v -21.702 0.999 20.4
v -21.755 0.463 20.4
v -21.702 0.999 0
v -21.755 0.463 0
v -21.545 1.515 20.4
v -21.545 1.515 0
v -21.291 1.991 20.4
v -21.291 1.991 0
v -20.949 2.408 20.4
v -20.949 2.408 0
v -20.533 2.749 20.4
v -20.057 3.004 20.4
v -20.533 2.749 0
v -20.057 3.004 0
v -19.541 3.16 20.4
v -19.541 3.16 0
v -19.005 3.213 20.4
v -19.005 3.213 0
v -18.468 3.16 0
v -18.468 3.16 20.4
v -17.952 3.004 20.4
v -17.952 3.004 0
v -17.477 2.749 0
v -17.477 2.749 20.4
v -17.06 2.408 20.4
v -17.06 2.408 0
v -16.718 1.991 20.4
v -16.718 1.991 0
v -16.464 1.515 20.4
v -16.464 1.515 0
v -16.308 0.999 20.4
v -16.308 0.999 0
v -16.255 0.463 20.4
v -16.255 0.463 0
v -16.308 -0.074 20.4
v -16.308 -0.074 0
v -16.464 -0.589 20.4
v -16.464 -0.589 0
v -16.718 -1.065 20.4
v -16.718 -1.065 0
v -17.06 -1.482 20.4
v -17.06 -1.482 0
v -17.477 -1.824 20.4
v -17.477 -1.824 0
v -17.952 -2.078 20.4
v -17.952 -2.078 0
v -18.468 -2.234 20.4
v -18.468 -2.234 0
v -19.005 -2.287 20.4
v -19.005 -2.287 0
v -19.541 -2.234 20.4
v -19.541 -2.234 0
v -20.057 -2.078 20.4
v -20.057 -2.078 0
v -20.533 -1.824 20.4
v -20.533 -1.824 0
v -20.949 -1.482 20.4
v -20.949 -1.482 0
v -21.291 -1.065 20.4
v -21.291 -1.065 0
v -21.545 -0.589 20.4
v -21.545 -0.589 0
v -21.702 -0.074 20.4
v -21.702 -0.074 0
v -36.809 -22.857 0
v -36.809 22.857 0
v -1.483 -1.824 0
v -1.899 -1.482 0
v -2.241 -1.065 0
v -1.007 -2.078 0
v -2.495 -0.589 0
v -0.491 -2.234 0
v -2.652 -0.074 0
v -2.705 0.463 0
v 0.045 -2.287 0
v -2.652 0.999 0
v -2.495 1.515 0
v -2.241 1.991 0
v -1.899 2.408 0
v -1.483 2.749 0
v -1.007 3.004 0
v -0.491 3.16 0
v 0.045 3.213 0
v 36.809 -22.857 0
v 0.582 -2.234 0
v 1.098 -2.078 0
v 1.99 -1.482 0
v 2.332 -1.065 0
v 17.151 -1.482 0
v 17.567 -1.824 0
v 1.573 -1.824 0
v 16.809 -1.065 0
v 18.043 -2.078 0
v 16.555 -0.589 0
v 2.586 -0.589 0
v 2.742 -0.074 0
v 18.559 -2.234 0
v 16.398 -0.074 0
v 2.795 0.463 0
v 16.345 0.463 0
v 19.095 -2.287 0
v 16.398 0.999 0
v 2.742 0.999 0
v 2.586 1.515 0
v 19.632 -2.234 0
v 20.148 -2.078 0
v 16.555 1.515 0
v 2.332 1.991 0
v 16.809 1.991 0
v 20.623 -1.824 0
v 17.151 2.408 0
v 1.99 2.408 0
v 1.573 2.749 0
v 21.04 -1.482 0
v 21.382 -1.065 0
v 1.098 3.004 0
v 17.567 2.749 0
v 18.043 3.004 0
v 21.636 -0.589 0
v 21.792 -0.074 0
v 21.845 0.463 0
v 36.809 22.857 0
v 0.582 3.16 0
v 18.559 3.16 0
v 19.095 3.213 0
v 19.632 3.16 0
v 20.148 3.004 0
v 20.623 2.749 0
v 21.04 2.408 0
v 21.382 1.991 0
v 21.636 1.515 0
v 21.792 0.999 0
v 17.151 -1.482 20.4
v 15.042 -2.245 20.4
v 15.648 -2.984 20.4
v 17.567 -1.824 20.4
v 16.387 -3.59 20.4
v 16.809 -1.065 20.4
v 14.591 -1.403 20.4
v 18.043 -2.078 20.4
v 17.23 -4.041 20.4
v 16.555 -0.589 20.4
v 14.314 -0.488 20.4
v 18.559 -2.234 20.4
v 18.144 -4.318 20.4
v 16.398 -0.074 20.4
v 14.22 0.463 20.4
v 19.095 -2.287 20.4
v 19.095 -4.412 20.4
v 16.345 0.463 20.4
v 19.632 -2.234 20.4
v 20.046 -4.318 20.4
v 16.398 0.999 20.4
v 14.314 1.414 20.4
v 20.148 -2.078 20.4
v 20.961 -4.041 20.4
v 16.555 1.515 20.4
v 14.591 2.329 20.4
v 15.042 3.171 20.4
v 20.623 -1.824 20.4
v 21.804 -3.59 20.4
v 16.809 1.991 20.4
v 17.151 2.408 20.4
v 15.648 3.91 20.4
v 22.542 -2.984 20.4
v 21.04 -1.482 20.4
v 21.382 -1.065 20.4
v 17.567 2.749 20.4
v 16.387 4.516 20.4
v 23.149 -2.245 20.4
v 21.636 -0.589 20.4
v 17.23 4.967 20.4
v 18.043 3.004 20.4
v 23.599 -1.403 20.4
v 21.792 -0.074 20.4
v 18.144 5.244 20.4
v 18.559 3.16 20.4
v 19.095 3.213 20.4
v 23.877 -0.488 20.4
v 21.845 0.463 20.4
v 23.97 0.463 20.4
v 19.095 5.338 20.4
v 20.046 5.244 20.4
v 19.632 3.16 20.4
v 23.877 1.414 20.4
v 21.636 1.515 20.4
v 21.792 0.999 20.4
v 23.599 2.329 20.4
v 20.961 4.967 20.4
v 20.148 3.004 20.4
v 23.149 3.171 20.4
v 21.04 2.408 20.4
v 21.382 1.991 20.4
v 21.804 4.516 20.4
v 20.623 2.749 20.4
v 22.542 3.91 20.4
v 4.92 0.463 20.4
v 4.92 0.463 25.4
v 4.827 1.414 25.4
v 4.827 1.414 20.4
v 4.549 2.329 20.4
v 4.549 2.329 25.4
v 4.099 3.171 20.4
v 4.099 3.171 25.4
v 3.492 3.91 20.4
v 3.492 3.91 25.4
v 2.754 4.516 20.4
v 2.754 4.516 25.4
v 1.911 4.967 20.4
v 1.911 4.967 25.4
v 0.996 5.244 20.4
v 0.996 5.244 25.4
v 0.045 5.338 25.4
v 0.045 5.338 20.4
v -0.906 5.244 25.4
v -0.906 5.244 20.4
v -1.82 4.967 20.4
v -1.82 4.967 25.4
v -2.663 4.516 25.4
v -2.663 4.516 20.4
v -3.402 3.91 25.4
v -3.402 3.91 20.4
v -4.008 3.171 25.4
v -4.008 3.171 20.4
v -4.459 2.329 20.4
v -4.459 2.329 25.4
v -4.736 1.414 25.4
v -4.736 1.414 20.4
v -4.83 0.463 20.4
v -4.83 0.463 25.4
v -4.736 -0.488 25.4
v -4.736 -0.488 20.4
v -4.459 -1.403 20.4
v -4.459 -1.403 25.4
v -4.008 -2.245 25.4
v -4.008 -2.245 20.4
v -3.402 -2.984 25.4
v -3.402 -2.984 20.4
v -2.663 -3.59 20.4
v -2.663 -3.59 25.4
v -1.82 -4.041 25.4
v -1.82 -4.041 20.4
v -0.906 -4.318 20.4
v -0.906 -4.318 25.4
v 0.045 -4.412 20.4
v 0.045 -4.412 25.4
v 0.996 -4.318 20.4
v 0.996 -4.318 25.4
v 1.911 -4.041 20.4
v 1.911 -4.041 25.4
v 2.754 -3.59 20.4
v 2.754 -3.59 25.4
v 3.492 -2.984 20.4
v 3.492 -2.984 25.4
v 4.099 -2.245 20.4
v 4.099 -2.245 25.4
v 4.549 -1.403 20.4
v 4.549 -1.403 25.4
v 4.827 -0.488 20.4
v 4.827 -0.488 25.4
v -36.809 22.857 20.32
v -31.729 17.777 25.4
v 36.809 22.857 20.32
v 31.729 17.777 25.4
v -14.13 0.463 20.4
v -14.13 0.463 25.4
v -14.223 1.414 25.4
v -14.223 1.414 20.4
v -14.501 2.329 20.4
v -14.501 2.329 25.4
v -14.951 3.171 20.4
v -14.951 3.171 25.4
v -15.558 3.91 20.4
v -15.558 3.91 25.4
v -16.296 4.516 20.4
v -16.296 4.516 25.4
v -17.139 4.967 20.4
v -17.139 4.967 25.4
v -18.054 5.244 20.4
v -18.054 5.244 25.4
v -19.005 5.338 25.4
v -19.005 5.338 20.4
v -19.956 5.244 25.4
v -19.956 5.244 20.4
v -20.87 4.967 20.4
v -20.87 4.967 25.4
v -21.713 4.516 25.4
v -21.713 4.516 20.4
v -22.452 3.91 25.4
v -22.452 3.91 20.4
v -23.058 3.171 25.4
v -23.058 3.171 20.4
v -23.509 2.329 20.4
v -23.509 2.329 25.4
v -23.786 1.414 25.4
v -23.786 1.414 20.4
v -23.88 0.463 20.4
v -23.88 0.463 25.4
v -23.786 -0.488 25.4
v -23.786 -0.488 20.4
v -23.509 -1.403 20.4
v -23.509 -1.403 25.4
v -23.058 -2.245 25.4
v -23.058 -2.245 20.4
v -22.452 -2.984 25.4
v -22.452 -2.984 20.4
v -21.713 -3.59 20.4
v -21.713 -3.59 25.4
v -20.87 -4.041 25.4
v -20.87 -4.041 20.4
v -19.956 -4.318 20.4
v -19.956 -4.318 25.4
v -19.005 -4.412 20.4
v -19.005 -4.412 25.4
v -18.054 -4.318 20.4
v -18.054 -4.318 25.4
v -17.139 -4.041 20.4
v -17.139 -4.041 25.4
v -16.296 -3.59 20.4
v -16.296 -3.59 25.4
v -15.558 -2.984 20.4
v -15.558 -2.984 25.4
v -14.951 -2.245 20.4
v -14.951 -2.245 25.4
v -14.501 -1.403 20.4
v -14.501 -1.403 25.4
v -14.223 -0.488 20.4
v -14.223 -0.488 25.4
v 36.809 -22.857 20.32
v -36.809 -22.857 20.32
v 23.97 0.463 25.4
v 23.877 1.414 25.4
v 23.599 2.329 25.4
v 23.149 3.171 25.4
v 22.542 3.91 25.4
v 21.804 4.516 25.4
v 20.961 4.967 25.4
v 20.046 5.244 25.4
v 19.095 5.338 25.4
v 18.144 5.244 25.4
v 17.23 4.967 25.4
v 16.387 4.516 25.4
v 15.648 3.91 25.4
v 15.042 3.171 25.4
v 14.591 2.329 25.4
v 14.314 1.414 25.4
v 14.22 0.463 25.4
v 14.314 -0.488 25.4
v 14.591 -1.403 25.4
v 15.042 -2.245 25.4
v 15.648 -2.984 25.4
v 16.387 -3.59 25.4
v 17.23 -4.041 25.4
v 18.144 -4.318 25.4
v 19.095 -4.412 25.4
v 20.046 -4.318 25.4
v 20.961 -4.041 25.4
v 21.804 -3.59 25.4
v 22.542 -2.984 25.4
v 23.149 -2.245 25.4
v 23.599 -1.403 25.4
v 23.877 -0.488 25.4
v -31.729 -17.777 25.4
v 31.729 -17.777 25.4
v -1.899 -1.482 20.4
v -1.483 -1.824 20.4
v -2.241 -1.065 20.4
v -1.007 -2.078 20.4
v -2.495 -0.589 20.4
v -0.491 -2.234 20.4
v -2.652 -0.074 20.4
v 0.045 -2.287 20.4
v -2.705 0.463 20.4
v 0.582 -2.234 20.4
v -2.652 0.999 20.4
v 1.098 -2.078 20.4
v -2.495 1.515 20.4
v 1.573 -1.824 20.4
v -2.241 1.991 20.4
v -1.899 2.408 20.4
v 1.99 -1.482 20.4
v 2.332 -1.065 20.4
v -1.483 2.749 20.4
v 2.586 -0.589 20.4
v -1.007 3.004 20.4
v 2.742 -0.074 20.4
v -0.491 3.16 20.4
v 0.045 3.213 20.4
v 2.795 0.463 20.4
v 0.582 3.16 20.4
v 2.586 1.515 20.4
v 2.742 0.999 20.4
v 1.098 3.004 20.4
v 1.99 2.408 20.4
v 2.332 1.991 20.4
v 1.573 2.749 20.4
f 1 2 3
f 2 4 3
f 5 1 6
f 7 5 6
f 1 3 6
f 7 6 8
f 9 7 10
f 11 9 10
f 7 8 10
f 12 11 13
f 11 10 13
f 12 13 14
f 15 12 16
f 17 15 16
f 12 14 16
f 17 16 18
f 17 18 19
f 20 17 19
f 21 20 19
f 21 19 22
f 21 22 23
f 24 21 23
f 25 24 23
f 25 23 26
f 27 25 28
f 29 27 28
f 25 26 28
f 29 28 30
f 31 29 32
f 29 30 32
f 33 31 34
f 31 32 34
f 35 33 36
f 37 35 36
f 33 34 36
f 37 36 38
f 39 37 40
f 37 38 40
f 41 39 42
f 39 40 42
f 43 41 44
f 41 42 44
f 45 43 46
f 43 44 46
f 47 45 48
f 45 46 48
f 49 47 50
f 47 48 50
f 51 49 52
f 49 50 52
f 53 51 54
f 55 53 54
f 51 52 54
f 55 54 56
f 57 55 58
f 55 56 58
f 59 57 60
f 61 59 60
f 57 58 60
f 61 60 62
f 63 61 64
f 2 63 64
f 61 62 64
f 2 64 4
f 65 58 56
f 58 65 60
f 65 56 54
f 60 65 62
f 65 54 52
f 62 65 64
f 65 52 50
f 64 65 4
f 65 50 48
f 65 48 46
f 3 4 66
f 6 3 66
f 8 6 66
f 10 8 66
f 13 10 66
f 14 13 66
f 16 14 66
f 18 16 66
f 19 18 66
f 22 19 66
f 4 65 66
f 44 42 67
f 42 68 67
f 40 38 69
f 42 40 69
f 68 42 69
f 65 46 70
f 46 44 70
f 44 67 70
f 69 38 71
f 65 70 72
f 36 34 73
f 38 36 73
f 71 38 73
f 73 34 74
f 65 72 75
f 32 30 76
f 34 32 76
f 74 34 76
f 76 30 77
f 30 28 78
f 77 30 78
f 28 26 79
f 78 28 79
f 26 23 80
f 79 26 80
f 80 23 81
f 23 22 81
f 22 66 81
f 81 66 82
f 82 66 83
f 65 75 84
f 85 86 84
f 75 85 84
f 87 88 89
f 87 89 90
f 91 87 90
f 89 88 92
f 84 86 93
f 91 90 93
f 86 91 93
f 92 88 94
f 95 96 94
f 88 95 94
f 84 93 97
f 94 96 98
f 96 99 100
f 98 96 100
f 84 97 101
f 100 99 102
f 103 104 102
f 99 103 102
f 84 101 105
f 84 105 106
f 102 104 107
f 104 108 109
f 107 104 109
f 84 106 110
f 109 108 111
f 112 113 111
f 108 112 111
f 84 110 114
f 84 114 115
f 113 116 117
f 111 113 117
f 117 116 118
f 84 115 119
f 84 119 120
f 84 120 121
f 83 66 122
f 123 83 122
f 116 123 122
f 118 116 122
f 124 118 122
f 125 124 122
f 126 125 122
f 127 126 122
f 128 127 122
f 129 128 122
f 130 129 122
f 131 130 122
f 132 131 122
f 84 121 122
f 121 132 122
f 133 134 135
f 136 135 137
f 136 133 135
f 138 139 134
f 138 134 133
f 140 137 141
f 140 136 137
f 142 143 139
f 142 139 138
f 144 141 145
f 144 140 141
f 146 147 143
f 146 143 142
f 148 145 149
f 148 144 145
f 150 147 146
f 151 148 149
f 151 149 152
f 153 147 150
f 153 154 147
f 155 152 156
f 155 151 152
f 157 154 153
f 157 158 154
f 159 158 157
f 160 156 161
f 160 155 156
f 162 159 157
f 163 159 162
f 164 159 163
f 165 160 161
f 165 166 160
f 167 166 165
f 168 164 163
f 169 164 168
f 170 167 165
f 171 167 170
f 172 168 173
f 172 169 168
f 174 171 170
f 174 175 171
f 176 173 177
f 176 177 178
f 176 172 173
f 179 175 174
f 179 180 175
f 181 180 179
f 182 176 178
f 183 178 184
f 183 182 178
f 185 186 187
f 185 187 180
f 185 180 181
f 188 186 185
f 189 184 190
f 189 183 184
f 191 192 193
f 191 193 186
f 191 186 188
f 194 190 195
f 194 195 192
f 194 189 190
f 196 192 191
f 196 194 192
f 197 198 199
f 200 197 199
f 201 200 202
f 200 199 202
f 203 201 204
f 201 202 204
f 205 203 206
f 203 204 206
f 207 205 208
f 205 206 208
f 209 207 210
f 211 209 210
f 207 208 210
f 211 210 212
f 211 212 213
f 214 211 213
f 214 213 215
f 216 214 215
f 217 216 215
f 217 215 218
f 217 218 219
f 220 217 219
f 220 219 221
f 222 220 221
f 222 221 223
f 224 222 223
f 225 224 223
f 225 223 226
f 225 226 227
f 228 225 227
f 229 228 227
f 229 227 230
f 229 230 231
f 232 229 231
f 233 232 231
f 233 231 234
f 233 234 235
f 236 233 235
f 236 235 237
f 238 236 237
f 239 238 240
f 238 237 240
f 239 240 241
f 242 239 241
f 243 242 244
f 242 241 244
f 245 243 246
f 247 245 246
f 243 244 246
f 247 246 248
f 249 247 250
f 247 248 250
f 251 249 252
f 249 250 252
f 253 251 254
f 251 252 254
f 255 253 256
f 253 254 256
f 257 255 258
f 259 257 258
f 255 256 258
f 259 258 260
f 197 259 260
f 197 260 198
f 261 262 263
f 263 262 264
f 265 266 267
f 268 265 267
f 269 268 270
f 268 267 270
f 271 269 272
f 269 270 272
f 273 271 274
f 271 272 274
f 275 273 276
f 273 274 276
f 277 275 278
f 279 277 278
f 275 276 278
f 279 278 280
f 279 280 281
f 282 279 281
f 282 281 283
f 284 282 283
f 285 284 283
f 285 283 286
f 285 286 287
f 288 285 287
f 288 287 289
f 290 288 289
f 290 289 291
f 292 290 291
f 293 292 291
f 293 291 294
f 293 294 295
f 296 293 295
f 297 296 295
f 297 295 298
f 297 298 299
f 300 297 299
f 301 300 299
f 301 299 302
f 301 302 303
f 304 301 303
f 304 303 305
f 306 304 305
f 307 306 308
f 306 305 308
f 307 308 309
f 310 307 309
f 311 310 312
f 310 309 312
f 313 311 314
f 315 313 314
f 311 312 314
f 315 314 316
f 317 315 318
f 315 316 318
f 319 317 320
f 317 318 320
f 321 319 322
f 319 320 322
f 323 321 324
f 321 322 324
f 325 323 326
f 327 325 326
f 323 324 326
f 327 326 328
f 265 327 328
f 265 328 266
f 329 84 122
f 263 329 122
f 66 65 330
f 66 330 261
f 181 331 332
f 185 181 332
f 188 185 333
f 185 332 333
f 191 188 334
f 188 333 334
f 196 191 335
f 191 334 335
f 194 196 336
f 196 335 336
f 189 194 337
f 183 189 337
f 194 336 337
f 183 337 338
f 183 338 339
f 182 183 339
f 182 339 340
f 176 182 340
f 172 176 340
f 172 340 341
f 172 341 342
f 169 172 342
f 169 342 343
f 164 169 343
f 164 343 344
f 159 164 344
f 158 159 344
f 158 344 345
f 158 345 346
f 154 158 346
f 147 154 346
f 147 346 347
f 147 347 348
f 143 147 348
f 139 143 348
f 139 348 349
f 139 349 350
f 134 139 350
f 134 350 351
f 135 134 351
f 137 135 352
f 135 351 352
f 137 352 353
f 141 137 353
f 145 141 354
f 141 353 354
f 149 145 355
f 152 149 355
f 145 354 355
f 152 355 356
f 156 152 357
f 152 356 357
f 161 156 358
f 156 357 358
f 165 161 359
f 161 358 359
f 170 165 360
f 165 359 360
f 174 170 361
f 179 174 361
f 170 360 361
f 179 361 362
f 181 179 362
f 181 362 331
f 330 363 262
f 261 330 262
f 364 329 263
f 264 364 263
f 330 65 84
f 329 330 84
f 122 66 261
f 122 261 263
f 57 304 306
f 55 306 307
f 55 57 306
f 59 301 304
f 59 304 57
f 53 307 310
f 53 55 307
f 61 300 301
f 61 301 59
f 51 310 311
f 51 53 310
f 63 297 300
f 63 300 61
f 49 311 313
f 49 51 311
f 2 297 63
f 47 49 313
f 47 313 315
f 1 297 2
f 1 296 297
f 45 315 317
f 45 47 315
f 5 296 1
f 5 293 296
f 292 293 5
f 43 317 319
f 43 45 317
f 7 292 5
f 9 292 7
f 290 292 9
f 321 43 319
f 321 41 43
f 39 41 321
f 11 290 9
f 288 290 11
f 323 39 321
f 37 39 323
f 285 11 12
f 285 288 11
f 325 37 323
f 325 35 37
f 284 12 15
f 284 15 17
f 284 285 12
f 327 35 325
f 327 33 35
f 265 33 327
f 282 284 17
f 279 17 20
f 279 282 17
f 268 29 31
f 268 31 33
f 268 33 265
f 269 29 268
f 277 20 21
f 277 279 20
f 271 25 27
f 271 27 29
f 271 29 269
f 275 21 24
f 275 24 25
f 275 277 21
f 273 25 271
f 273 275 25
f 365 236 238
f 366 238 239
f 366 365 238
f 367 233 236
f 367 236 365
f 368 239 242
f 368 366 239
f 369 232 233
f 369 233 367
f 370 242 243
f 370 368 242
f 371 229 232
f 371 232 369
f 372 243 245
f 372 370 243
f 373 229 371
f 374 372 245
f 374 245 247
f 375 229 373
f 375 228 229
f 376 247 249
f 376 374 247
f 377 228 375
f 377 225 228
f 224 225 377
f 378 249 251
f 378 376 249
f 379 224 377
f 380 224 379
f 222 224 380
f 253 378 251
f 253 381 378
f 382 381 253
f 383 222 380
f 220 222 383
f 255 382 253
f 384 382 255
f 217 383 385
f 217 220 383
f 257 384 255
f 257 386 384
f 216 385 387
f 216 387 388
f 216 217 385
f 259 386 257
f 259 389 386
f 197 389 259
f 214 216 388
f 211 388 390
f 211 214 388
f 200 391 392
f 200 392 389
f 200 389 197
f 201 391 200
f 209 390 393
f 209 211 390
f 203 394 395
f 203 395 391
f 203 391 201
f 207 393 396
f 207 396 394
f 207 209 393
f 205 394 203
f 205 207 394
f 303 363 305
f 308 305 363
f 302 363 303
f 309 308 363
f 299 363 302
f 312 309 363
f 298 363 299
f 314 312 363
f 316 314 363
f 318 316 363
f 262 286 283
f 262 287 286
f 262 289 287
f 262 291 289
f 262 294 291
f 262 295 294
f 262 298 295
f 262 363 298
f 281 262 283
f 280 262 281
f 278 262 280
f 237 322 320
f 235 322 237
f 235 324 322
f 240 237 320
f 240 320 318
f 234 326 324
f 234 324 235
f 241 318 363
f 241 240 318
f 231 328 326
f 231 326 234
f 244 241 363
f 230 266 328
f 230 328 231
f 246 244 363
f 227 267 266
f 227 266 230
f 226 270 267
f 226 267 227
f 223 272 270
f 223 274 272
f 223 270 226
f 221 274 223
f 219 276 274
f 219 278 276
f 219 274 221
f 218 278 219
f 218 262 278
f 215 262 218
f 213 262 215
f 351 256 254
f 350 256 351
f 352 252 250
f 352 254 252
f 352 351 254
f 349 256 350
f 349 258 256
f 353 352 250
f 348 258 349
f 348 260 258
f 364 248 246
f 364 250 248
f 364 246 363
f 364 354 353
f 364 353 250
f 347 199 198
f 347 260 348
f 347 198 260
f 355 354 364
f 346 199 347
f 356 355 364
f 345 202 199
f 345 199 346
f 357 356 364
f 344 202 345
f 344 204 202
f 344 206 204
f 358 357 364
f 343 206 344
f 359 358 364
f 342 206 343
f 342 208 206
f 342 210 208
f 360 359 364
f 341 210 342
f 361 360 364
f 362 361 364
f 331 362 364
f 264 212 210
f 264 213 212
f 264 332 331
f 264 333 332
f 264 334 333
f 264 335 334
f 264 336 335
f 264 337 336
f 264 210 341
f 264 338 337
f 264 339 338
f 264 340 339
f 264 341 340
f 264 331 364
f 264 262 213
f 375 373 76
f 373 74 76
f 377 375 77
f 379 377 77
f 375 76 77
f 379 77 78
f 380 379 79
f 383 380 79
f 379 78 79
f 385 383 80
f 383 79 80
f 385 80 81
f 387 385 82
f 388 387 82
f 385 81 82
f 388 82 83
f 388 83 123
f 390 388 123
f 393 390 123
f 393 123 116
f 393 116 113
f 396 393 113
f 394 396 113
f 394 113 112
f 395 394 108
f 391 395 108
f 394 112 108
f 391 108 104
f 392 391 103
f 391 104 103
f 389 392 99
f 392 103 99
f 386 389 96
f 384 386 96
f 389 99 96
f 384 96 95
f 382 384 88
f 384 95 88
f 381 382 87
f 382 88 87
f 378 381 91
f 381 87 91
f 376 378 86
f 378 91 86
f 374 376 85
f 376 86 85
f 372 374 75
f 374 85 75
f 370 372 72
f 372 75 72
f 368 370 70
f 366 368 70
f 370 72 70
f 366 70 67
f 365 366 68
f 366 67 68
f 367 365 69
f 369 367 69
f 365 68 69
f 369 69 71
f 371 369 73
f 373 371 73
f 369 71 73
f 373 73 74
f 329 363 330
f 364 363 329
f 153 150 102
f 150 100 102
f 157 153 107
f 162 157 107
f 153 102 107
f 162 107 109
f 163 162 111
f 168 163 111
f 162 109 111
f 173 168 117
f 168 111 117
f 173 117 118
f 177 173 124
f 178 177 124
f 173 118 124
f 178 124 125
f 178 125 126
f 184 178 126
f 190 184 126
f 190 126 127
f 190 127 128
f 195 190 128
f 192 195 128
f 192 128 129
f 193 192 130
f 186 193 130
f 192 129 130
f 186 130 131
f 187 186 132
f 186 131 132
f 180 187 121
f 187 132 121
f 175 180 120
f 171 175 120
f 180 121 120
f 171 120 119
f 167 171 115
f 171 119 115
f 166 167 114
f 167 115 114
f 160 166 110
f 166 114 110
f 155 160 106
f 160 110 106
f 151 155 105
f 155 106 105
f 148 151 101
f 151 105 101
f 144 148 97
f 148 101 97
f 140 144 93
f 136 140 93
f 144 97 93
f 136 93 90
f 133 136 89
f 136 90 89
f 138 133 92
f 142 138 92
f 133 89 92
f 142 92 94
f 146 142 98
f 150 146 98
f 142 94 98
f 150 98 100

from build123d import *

# Parameters (mm, degrees)
F0_W           = 73.618516326
F0_H           = 45.713365078
F1_DEPTH       = 25.4
F3_D           = 5.5
F3_CBORE_D     = 9.75
F3_CBORE_DEPTH = 5
F4_SIZE        = 5.08


with BuildPart() as f1:
    # F0 (on Top) → F1 (new body)
    with BuildSketch(Plane.XY):
        Rectangle(F0_W, F0_H)
    extrude(amount=F1_DEPTH)

    # F3 (through all)
    with Locations(Plane.XY.offset(25.4)):
        with Locations((0.0451991563, 0.4629576465), (-19.0048008437, 0.4629576465), (19.0951991563, 0.4629576465)):
            CounterBoreHole(F3_D / 2, F3_CBORE_D / 2, F3_CBORE_DEPTH)

    # F4
    f4_edges = [f1.edges().sort_by_distance(p)[0] for p in [
        (36.809258, 0, 25.4),
        (0, 22.856683, 25.4),
        (-36.809258, 0, 25.4),
        (0, -22.856683, 25.4),
    ]]
    chamfer(f4_edges, length=F4_SIZE)


solid = f1.part
